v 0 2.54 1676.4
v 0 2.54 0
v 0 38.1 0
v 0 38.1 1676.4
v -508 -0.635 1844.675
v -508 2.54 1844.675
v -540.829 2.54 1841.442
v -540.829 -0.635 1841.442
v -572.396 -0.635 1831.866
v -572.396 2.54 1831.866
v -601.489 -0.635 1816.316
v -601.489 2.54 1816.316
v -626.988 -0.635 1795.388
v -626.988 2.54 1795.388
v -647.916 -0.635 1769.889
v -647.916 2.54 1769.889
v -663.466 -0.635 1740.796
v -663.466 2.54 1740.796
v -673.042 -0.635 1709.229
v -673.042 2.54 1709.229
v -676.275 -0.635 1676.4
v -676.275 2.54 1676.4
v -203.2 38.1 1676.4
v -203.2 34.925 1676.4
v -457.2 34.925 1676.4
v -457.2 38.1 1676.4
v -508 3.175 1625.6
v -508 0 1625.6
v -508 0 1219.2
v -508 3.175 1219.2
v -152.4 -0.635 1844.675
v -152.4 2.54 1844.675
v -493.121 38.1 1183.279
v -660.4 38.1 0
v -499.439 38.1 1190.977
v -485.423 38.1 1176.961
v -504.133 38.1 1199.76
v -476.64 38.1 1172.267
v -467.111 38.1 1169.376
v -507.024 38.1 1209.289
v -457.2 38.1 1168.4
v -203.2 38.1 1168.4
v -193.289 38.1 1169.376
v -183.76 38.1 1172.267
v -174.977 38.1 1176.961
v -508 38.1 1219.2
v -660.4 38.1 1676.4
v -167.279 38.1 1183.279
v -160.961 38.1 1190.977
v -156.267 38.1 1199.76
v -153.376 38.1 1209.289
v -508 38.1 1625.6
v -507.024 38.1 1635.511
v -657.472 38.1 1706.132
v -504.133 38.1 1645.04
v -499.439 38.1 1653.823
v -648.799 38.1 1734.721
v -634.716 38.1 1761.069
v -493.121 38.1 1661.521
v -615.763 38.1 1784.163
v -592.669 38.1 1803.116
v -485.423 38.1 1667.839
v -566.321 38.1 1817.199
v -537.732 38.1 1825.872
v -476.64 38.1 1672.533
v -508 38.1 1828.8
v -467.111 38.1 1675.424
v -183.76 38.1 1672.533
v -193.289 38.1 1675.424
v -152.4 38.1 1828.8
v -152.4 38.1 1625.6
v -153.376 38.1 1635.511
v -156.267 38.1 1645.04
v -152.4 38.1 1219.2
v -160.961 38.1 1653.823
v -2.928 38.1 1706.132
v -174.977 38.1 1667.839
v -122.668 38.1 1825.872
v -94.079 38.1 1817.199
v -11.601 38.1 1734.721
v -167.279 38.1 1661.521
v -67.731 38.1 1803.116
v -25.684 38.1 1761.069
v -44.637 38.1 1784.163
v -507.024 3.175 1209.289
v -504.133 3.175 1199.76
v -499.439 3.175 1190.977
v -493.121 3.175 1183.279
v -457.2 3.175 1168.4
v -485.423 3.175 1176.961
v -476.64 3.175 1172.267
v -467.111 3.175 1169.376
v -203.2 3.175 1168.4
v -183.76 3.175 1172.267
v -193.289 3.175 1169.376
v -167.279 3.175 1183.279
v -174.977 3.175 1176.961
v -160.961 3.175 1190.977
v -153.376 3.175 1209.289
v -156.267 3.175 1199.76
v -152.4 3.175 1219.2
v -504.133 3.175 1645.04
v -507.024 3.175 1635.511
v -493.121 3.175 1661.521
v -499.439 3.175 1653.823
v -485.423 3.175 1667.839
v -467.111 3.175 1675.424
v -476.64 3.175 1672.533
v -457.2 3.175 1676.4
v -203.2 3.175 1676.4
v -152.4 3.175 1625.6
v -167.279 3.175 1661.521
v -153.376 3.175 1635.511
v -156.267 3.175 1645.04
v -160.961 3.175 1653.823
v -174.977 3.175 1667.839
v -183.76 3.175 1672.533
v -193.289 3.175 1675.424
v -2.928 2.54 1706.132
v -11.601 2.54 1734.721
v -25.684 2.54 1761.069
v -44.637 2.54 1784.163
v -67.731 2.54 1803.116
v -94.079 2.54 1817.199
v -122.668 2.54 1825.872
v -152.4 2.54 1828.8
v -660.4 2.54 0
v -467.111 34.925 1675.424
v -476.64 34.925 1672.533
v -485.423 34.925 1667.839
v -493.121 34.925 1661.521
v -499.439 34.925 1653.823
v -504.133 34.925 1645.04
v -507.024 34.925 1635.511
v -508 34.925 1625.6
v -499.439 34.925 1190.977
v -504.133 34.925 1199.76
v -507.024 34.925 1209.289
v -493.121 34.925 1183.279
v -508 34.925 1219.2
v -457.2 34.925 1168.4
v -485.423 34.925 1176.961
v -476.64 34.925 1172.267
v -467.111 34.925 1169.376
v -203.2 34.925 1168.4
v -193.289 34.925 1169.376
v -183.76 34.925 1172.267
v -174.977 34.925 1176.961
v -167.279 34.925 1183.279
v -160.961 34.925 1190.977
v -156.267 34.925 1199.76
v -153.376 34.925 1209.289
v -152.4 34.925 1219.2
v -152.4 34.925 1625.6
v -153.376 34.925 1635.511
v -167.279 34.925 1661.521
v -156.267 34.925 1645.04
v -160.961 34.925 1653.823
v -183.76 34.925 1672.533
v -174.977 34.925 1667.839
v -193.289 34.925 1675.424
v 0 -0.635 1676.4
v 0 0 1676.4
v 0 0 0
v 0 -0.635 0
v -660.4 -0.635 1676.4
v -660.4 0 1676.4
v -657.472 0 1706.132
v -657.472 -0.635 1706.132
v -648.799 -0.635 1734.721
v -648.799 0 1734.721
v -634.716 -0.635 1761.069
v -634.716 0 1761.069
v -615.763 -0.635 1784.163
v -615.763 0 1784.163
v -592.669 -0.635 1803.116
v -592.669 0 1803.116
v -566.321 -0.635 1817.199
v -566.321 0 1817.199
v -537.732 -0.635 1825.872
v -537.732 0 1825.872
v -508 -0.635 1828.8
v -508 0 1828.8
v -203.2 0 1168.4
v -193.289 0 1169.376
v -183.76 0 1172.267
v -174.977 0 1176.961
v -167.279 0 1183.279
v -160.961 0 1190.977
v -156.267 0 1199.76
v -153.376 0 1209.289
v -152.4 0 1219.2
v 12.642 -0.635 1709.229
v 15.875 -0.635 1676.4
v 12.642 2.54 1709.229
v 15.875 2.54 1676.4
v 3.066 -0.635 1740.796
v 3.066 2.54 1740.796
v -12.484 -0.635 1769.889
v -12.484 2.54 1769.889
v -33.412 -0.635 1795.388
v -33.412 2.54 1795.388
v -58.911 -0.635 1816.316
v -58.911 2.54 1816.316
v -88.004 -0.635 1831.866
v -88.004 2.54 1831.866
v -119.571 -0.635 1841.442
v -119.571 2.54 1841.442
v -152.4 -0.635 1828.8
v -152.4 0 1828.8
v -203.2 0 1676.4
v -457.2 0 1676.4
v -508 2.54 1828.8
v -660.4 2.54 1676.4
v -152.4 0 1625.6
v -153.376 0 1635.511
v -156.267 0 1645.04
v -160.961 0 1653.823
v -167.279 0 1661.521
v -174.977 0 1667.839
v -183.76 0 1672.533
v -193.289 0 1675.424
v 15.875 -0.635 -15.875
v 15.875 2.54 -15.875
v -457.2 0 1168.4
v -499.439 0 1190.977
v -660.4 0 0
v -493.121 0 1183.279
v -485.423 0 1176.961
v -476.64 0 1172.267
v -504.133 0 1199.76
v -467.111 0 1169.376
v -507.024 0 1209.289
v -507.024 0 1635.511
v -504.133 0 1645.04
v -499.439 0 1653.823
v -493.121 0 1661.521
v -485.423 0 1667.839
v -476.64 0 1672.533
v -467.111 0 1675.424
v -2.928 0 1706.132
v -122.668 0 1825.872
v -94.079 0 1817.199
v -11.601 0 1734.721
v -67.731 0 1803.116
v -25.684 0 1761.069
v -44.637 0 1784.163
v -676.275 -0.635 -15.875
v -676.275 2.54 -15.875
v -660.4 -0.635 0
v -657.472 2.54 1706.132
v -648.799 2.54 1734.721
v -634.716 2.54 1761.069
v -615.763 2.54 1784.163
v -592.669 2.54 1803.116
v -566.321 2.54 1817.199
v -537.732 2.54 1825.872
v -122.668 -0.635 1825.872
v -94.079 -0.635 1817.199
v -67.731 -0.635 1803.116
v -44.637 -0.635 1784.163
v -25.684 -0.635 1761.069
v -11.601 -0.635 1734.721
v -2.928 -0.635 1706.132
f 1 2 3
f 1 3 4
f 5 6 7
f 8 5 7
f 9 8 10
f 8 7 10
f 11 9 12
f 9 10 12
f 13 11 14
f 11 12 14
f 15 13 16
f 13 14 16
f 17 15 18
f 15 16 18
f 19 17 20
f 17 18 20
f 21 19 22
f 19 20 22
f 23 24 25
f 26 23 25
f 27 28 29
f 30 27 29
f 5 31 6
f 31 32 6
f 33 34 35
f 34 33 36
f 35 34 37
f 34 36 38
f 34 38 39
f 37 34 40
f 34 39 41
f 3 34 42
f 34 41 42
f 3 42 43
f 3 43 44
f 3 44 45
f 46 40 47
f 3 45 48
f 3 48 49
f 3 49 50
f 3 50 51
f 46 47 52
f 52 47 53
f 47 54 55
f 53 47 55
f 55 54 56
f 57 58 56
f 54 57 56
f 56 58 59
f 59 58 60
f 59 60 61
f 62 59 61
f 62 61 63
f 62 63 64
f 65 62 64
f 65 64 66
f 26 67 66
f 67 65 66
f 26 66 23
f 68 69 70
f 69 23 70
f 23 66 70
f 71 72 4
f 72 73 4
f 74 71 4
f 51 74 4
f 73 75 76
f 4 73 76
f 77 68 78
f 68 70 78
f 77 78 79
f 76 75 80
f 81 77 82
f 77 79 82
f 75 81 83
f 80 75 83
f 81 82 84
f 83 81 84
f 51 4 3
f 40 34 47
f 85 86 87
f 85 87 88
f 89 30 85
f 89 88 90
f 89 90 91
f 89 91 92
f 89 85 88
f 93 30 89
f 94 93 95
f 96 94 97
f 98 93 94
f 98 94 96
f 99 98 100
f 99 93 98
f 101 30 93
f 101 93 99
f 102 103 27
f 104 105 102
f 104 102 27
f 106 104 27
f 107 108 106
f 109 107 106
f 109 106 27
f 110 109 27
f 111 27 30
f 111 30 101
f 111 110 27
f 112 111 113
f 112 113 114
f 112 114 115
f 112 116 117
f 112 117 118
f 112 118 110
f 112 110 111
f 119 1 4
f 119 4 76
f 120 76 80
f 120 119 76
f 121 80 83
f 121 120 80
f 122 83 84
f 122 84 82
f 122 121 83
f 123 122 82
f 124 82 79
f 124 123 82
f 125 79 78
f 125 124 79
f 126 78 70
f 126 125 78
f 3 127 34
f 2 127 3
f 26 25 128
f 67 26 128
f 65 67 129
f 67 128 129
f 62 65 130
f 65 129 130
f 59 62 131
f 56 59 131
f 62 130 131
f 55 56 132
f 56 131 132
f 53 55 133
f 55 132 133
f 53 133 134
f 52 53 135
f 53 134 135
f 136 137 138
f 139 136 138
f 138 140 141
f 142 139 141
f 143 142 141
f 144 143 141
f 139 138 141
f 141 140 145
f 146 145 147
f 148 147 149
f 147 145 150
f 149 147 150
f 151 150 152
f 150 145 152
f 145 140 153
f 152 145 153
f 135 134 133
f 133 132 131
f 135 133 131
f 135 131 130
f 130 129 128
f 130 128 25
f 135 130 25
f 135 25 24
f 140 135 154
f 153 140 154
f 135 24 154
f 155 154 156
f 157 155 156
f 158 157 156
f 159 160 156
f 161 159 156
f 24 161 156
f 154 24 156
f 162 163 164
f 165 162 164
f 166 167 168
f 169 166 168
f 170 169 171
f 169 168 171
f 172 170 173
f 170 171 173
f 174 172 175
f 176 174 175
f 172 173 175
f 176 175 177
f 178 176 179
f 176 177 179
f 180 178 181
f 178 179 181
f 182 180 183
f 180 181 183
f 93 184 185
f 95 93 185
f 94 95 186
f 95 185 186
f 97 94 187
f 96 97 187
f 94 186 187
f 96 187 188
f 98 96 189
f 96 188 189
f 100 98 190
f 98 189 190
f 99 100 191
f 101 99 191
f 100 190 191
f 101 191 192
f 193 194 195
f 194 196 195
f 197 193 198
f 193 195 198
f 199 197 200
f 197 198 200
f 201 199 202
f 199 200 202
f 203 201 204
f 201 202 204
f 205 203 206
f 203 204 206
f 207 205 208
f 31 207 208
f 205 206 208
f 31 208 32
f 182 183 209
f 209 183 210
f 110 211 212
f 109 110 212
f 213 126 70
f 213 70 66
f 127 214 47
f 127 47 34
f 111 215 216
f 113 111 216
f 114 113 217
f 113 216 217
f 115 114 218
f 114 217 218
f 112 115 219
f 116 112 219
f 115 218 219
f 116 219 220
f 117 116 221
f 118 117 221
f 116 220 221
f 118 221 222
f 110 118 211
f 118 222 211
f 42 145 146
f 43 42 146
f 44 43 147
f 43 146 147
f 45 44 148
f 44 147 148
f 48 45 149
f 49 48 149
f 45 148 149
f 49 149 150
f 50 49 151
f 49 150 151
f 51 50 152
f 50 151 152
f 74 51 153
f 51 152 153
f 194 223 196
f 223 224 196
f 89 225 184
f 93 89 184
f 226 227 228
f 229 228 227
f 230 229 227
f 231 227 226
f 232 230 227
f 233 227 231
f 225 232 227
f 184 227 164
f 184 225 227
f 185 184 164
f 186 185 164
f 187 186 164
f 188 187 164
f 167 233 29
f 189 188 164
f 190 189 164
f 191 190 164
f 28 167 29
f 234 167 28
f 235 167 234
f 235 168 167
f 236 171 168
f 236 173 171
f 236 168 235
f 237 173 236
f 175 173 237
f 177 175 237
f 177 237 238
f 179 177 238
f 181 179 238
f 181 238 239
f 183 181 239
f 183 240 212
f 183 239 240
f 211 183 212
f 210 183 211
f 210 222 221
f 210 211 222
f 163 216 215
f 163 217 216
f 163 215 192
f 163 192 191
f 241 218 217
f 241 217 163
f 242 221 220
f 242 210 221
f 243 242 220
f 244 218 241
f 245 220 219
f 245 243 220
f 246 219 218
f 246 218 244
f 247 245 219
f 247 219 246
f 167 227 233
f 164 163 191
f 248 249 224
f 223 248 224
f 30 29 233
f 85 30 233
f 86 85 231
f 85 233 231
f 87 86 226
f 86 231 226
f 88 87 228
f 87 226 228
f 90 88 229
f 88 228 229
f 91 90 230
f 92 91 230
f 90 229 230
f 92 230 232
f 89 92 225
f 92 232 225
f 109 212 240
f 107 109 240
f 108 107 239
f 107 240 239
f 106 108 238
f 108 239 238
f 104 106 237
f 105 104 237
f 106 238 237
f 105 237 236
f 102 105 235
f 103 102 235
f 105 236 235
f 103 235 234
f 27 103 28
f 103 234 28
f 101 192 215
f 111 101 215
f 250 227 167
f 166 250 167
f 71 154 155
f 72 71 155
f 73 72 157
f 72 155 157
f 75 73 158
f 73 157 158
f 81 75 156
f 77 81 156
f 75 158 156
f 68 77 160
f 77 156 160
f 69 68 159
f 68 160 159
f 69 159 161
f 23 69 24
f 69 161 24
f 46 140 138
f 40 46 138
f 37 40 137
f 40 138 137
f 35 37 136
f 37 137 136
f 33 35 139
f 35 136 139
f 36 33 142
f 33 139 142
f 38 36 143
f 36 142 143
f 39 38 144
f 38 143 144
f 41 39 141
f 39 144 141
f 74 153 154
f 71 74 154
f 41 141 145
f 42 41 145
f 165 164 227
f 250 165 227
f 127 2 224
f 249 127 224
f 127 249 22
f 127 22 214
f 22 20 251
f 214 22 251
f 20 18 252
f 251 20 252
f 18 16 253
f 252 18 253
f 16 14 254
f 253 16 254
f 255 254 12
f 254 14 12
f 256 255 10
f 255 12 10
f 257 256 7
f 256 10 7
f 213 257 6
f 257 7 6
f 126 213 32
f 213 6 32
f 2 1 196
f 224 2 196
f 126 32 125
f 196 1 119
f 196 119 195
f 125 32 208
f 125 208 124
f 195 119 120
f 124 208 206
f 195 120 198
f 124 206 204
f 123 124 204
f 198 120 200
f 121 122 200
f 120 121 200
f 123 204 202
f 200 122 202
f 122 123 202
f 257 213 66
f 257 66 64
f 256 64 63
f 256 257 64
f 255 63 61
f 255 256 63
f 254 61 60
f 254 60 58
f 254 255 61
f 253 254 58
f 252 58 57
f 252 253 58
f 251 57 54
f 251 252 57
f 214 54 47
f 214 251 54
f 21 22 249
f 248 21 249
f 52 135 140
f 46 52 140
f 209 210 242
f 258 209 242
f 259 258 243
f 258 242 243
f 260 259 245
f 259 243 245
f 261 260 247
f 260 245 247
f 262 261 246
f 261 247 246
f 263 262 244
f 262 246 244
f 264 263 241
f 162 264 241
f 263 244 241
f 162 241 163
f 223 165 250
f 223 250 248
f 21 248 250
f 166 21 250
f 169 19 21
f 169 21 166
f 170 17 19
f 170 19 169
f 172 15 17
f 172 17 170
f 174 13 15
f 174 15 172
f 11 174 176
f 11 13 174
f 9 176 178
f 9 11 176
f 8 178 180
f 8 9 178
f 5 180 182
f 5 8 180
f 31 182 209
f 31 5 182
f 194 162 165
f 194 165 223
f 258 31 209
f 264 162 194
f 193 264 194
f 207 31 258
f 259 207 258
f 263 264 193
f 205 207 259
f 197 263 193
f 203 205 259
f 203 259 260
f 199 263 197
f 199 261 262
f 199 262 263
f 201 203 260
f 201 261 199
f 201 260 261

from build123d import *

# Parameters (mm, degrees)
F1_DEPTH      = 38.1
F2_DEPTH      = 2.54
F2_DEPTH_BACK = 0.635
F3_DEPTH      = 3.175
F4_START      = -34.925
F4_DEPTH      = 3.175


with BuildPart() as f1:
    # F0 (on Front) → F1 (new body)
    with BuildSketch(Plane.XZ):
        with BuildLine():
            Line((-660.4, 0), (0, 0))
            Line((0, 0), (0, 1676.4))
            ThreePointArc((0, 1676.4), (-44.6369265472, 1784.1630734528), (-152.4, 1828.8))
            Line((-152.4, 1828.8), (-508, 1828.8))
            ThreePointArc((-508, 1828.8), (-615.7630734528, 1784.1630734528), (-660.4, 1676.4))
            Line((-660.4, 1676.4), (-660.4, 0))
        make_face()
        with BuildLine():
            ThreePointArc((-508, 1625.6), (-493.1210244843, 1661.5210244843), (-457.2, 1676.4))
            Line((-457.2, 1676.4), (-203.2, 1676.4))
            ThreePointArc((-203.2, 1676.4), (-167.2789755157, 1661.5210244843), (-152.4, 1625.6))
            Line((-152.4, 1625.6), (-152.4, 1219.2))
            ThreePointArc((-152.4, 1219.2), (-167.2789755157, 1183.2789755157), (-203.2, 1168.4))
            Line((-203.2, 1168.4), (-457.2, 1168.4))
            ThreePointArc((-457.2, 1168.4), (-493.1210244843, 1183.2789755157), (-508, 1219.2))
            Line((-508, 1219.2), (-508, 1625.6))
        make_face(mode=Mode.SUBTRACT)
        with BuildLine():
            Line((-203.2, 1676.4), (-457.2, 1676.4))
            ThreePointArc((-457.2, 1676.4), (-493.1210244843, 1661.5210244843), (-508, 1625.6))
            Line((-508, 1625.6), (-508, 1219.2))
            ThreePointArc((-508, 1219.2), (-493.1210244843, 1183.2789755157), (-457.2, 1168.4))
            Line((-457.2, 1168.4), (-203.2, 1168.4))
            ThreePointArc((-203.2, 1168.4), (-167.2789755157, 1183.2789755157), (-152.4, 1219.2))
            Line((-152.4, 1219.2), (-152.4, 1625.6))
            ThreePointArc((-152.4, 1625.6), (-167.2789755157, 1661.5210244843), (-203.2, 1676.4))
        make_face()
    extrude(amount=-F1_DEPTH)

    # F0 (on Front) → F2 (join, two sides)
    with BuildSketch(Plane.XZ) as f2_sk:
        with BuildLine():
            Line((-676.275, -15.875), (15.875, -15.875))
            Line((15.875, -15.875), (15.875, 1676.4))
            ThreePointArc((15.875, 1676.4), (-33.4116063958, 1795.3883936042), (-152.4, 1844.675))
            Line((-152.4, 1844.675), (-508, 1844.675))
            ThreePointArc((-508, 1844.675), (-626.9883936042, 1795.3883936042), (-676.275, 1676.4))
            Line((-676.275, 1676.4), (-676.275, -15.875))
        make_face()
        with BuildLine():
            Line((0, 1676.4), (0, 0))
            Line((0, 0), (-660.4, 0))
            Line((-660.4, 0), (-660.4, 1676.4))
            ThreePointArc((-660.4, 1676.4), (-615.7630734528, 1784.1630734528), (-508, 1828.8))
            Line((-508, 1828.8), (-152.4, 1828.8))
            ThreePointArc((-152.4, 1828.8), (-44.6369265472, 1784.1630734528), (0, 1676.4))
        make_face(mode=Mode.SUBTRACT)
    extrude(amount=-F2_DEPTH)
    extrude(f2_sk.sketch, amount=F2_DEPTH_BACK)

    # F0 (on Front) → F3 (cut)
    with BuildSketch(Plane.XZ):
        with BuildLine():
            Line((-203.2, 1676.4), (-457.2, 1676.4))
            ThreePointArc((-457.2, 1676.4), (-493.1210244843, 1661.5210244843), (-508, 1625.6))
            Line((-508, 1625.6), (-508, 1219.2))
            ThreePointArc((-508, 1219.2), (-493.1210244843, 1183.2789755157), (-457.2, 1168.4))
            Line((-457.2, 1168.4), (-203.2, 1168.4))
            ThreePointArc((-203.2, 1168.4), (-167.2789755157, 1183.2789755157), (-152.4, 1219.2))
            Line((-152.4, 1219.2), (-152.4, 1625.6))
            ThreePointArc((-152.4, 1625.6), (-167.2789755157, 1661.5210244843), (-203.2, 1676.4))
        make_face()
    extrude(amount=-F3_DEPTH, mode=Mode.SUBTRACT)

    # F0 (on Front) → F4 (cut)
    with BuildSketch(Plane.XZ.offset(F4_START)):
        with BuildLine():
            Line((-203.2, 1676.4), (-457.2, 1676.4))
            ThreePointArc((-457.2, 1676.4), (-493.1210244843, 1661.5210244843), (-508, 1625.6))
            Line((-508, 1625.6), (-508, 1219.2))
            ThreePointArc((-508, 1219.2), (-493.1210244843, 1183.2789755157), (-457.2, 1168.4))
            Line((-457.2, 1168.4), (-203.2, 1168.4))
            ThreePointArc((-203.2, 1168.4), (-167.2789755157, 1183.2789755157), (-152.4, 1219.2))
            Line((-152.4, 1219.2), (-152.4, 1625.6))
            ThreePointArc((-152.4, 1625.6), (-167.2789755157, 1661.5210244843), (-203.2, 1676.4))
        make_face()
    extrude(amount=-F4_DEPTH, mode=Mode.SUBTRACT)


solid = f1.part
